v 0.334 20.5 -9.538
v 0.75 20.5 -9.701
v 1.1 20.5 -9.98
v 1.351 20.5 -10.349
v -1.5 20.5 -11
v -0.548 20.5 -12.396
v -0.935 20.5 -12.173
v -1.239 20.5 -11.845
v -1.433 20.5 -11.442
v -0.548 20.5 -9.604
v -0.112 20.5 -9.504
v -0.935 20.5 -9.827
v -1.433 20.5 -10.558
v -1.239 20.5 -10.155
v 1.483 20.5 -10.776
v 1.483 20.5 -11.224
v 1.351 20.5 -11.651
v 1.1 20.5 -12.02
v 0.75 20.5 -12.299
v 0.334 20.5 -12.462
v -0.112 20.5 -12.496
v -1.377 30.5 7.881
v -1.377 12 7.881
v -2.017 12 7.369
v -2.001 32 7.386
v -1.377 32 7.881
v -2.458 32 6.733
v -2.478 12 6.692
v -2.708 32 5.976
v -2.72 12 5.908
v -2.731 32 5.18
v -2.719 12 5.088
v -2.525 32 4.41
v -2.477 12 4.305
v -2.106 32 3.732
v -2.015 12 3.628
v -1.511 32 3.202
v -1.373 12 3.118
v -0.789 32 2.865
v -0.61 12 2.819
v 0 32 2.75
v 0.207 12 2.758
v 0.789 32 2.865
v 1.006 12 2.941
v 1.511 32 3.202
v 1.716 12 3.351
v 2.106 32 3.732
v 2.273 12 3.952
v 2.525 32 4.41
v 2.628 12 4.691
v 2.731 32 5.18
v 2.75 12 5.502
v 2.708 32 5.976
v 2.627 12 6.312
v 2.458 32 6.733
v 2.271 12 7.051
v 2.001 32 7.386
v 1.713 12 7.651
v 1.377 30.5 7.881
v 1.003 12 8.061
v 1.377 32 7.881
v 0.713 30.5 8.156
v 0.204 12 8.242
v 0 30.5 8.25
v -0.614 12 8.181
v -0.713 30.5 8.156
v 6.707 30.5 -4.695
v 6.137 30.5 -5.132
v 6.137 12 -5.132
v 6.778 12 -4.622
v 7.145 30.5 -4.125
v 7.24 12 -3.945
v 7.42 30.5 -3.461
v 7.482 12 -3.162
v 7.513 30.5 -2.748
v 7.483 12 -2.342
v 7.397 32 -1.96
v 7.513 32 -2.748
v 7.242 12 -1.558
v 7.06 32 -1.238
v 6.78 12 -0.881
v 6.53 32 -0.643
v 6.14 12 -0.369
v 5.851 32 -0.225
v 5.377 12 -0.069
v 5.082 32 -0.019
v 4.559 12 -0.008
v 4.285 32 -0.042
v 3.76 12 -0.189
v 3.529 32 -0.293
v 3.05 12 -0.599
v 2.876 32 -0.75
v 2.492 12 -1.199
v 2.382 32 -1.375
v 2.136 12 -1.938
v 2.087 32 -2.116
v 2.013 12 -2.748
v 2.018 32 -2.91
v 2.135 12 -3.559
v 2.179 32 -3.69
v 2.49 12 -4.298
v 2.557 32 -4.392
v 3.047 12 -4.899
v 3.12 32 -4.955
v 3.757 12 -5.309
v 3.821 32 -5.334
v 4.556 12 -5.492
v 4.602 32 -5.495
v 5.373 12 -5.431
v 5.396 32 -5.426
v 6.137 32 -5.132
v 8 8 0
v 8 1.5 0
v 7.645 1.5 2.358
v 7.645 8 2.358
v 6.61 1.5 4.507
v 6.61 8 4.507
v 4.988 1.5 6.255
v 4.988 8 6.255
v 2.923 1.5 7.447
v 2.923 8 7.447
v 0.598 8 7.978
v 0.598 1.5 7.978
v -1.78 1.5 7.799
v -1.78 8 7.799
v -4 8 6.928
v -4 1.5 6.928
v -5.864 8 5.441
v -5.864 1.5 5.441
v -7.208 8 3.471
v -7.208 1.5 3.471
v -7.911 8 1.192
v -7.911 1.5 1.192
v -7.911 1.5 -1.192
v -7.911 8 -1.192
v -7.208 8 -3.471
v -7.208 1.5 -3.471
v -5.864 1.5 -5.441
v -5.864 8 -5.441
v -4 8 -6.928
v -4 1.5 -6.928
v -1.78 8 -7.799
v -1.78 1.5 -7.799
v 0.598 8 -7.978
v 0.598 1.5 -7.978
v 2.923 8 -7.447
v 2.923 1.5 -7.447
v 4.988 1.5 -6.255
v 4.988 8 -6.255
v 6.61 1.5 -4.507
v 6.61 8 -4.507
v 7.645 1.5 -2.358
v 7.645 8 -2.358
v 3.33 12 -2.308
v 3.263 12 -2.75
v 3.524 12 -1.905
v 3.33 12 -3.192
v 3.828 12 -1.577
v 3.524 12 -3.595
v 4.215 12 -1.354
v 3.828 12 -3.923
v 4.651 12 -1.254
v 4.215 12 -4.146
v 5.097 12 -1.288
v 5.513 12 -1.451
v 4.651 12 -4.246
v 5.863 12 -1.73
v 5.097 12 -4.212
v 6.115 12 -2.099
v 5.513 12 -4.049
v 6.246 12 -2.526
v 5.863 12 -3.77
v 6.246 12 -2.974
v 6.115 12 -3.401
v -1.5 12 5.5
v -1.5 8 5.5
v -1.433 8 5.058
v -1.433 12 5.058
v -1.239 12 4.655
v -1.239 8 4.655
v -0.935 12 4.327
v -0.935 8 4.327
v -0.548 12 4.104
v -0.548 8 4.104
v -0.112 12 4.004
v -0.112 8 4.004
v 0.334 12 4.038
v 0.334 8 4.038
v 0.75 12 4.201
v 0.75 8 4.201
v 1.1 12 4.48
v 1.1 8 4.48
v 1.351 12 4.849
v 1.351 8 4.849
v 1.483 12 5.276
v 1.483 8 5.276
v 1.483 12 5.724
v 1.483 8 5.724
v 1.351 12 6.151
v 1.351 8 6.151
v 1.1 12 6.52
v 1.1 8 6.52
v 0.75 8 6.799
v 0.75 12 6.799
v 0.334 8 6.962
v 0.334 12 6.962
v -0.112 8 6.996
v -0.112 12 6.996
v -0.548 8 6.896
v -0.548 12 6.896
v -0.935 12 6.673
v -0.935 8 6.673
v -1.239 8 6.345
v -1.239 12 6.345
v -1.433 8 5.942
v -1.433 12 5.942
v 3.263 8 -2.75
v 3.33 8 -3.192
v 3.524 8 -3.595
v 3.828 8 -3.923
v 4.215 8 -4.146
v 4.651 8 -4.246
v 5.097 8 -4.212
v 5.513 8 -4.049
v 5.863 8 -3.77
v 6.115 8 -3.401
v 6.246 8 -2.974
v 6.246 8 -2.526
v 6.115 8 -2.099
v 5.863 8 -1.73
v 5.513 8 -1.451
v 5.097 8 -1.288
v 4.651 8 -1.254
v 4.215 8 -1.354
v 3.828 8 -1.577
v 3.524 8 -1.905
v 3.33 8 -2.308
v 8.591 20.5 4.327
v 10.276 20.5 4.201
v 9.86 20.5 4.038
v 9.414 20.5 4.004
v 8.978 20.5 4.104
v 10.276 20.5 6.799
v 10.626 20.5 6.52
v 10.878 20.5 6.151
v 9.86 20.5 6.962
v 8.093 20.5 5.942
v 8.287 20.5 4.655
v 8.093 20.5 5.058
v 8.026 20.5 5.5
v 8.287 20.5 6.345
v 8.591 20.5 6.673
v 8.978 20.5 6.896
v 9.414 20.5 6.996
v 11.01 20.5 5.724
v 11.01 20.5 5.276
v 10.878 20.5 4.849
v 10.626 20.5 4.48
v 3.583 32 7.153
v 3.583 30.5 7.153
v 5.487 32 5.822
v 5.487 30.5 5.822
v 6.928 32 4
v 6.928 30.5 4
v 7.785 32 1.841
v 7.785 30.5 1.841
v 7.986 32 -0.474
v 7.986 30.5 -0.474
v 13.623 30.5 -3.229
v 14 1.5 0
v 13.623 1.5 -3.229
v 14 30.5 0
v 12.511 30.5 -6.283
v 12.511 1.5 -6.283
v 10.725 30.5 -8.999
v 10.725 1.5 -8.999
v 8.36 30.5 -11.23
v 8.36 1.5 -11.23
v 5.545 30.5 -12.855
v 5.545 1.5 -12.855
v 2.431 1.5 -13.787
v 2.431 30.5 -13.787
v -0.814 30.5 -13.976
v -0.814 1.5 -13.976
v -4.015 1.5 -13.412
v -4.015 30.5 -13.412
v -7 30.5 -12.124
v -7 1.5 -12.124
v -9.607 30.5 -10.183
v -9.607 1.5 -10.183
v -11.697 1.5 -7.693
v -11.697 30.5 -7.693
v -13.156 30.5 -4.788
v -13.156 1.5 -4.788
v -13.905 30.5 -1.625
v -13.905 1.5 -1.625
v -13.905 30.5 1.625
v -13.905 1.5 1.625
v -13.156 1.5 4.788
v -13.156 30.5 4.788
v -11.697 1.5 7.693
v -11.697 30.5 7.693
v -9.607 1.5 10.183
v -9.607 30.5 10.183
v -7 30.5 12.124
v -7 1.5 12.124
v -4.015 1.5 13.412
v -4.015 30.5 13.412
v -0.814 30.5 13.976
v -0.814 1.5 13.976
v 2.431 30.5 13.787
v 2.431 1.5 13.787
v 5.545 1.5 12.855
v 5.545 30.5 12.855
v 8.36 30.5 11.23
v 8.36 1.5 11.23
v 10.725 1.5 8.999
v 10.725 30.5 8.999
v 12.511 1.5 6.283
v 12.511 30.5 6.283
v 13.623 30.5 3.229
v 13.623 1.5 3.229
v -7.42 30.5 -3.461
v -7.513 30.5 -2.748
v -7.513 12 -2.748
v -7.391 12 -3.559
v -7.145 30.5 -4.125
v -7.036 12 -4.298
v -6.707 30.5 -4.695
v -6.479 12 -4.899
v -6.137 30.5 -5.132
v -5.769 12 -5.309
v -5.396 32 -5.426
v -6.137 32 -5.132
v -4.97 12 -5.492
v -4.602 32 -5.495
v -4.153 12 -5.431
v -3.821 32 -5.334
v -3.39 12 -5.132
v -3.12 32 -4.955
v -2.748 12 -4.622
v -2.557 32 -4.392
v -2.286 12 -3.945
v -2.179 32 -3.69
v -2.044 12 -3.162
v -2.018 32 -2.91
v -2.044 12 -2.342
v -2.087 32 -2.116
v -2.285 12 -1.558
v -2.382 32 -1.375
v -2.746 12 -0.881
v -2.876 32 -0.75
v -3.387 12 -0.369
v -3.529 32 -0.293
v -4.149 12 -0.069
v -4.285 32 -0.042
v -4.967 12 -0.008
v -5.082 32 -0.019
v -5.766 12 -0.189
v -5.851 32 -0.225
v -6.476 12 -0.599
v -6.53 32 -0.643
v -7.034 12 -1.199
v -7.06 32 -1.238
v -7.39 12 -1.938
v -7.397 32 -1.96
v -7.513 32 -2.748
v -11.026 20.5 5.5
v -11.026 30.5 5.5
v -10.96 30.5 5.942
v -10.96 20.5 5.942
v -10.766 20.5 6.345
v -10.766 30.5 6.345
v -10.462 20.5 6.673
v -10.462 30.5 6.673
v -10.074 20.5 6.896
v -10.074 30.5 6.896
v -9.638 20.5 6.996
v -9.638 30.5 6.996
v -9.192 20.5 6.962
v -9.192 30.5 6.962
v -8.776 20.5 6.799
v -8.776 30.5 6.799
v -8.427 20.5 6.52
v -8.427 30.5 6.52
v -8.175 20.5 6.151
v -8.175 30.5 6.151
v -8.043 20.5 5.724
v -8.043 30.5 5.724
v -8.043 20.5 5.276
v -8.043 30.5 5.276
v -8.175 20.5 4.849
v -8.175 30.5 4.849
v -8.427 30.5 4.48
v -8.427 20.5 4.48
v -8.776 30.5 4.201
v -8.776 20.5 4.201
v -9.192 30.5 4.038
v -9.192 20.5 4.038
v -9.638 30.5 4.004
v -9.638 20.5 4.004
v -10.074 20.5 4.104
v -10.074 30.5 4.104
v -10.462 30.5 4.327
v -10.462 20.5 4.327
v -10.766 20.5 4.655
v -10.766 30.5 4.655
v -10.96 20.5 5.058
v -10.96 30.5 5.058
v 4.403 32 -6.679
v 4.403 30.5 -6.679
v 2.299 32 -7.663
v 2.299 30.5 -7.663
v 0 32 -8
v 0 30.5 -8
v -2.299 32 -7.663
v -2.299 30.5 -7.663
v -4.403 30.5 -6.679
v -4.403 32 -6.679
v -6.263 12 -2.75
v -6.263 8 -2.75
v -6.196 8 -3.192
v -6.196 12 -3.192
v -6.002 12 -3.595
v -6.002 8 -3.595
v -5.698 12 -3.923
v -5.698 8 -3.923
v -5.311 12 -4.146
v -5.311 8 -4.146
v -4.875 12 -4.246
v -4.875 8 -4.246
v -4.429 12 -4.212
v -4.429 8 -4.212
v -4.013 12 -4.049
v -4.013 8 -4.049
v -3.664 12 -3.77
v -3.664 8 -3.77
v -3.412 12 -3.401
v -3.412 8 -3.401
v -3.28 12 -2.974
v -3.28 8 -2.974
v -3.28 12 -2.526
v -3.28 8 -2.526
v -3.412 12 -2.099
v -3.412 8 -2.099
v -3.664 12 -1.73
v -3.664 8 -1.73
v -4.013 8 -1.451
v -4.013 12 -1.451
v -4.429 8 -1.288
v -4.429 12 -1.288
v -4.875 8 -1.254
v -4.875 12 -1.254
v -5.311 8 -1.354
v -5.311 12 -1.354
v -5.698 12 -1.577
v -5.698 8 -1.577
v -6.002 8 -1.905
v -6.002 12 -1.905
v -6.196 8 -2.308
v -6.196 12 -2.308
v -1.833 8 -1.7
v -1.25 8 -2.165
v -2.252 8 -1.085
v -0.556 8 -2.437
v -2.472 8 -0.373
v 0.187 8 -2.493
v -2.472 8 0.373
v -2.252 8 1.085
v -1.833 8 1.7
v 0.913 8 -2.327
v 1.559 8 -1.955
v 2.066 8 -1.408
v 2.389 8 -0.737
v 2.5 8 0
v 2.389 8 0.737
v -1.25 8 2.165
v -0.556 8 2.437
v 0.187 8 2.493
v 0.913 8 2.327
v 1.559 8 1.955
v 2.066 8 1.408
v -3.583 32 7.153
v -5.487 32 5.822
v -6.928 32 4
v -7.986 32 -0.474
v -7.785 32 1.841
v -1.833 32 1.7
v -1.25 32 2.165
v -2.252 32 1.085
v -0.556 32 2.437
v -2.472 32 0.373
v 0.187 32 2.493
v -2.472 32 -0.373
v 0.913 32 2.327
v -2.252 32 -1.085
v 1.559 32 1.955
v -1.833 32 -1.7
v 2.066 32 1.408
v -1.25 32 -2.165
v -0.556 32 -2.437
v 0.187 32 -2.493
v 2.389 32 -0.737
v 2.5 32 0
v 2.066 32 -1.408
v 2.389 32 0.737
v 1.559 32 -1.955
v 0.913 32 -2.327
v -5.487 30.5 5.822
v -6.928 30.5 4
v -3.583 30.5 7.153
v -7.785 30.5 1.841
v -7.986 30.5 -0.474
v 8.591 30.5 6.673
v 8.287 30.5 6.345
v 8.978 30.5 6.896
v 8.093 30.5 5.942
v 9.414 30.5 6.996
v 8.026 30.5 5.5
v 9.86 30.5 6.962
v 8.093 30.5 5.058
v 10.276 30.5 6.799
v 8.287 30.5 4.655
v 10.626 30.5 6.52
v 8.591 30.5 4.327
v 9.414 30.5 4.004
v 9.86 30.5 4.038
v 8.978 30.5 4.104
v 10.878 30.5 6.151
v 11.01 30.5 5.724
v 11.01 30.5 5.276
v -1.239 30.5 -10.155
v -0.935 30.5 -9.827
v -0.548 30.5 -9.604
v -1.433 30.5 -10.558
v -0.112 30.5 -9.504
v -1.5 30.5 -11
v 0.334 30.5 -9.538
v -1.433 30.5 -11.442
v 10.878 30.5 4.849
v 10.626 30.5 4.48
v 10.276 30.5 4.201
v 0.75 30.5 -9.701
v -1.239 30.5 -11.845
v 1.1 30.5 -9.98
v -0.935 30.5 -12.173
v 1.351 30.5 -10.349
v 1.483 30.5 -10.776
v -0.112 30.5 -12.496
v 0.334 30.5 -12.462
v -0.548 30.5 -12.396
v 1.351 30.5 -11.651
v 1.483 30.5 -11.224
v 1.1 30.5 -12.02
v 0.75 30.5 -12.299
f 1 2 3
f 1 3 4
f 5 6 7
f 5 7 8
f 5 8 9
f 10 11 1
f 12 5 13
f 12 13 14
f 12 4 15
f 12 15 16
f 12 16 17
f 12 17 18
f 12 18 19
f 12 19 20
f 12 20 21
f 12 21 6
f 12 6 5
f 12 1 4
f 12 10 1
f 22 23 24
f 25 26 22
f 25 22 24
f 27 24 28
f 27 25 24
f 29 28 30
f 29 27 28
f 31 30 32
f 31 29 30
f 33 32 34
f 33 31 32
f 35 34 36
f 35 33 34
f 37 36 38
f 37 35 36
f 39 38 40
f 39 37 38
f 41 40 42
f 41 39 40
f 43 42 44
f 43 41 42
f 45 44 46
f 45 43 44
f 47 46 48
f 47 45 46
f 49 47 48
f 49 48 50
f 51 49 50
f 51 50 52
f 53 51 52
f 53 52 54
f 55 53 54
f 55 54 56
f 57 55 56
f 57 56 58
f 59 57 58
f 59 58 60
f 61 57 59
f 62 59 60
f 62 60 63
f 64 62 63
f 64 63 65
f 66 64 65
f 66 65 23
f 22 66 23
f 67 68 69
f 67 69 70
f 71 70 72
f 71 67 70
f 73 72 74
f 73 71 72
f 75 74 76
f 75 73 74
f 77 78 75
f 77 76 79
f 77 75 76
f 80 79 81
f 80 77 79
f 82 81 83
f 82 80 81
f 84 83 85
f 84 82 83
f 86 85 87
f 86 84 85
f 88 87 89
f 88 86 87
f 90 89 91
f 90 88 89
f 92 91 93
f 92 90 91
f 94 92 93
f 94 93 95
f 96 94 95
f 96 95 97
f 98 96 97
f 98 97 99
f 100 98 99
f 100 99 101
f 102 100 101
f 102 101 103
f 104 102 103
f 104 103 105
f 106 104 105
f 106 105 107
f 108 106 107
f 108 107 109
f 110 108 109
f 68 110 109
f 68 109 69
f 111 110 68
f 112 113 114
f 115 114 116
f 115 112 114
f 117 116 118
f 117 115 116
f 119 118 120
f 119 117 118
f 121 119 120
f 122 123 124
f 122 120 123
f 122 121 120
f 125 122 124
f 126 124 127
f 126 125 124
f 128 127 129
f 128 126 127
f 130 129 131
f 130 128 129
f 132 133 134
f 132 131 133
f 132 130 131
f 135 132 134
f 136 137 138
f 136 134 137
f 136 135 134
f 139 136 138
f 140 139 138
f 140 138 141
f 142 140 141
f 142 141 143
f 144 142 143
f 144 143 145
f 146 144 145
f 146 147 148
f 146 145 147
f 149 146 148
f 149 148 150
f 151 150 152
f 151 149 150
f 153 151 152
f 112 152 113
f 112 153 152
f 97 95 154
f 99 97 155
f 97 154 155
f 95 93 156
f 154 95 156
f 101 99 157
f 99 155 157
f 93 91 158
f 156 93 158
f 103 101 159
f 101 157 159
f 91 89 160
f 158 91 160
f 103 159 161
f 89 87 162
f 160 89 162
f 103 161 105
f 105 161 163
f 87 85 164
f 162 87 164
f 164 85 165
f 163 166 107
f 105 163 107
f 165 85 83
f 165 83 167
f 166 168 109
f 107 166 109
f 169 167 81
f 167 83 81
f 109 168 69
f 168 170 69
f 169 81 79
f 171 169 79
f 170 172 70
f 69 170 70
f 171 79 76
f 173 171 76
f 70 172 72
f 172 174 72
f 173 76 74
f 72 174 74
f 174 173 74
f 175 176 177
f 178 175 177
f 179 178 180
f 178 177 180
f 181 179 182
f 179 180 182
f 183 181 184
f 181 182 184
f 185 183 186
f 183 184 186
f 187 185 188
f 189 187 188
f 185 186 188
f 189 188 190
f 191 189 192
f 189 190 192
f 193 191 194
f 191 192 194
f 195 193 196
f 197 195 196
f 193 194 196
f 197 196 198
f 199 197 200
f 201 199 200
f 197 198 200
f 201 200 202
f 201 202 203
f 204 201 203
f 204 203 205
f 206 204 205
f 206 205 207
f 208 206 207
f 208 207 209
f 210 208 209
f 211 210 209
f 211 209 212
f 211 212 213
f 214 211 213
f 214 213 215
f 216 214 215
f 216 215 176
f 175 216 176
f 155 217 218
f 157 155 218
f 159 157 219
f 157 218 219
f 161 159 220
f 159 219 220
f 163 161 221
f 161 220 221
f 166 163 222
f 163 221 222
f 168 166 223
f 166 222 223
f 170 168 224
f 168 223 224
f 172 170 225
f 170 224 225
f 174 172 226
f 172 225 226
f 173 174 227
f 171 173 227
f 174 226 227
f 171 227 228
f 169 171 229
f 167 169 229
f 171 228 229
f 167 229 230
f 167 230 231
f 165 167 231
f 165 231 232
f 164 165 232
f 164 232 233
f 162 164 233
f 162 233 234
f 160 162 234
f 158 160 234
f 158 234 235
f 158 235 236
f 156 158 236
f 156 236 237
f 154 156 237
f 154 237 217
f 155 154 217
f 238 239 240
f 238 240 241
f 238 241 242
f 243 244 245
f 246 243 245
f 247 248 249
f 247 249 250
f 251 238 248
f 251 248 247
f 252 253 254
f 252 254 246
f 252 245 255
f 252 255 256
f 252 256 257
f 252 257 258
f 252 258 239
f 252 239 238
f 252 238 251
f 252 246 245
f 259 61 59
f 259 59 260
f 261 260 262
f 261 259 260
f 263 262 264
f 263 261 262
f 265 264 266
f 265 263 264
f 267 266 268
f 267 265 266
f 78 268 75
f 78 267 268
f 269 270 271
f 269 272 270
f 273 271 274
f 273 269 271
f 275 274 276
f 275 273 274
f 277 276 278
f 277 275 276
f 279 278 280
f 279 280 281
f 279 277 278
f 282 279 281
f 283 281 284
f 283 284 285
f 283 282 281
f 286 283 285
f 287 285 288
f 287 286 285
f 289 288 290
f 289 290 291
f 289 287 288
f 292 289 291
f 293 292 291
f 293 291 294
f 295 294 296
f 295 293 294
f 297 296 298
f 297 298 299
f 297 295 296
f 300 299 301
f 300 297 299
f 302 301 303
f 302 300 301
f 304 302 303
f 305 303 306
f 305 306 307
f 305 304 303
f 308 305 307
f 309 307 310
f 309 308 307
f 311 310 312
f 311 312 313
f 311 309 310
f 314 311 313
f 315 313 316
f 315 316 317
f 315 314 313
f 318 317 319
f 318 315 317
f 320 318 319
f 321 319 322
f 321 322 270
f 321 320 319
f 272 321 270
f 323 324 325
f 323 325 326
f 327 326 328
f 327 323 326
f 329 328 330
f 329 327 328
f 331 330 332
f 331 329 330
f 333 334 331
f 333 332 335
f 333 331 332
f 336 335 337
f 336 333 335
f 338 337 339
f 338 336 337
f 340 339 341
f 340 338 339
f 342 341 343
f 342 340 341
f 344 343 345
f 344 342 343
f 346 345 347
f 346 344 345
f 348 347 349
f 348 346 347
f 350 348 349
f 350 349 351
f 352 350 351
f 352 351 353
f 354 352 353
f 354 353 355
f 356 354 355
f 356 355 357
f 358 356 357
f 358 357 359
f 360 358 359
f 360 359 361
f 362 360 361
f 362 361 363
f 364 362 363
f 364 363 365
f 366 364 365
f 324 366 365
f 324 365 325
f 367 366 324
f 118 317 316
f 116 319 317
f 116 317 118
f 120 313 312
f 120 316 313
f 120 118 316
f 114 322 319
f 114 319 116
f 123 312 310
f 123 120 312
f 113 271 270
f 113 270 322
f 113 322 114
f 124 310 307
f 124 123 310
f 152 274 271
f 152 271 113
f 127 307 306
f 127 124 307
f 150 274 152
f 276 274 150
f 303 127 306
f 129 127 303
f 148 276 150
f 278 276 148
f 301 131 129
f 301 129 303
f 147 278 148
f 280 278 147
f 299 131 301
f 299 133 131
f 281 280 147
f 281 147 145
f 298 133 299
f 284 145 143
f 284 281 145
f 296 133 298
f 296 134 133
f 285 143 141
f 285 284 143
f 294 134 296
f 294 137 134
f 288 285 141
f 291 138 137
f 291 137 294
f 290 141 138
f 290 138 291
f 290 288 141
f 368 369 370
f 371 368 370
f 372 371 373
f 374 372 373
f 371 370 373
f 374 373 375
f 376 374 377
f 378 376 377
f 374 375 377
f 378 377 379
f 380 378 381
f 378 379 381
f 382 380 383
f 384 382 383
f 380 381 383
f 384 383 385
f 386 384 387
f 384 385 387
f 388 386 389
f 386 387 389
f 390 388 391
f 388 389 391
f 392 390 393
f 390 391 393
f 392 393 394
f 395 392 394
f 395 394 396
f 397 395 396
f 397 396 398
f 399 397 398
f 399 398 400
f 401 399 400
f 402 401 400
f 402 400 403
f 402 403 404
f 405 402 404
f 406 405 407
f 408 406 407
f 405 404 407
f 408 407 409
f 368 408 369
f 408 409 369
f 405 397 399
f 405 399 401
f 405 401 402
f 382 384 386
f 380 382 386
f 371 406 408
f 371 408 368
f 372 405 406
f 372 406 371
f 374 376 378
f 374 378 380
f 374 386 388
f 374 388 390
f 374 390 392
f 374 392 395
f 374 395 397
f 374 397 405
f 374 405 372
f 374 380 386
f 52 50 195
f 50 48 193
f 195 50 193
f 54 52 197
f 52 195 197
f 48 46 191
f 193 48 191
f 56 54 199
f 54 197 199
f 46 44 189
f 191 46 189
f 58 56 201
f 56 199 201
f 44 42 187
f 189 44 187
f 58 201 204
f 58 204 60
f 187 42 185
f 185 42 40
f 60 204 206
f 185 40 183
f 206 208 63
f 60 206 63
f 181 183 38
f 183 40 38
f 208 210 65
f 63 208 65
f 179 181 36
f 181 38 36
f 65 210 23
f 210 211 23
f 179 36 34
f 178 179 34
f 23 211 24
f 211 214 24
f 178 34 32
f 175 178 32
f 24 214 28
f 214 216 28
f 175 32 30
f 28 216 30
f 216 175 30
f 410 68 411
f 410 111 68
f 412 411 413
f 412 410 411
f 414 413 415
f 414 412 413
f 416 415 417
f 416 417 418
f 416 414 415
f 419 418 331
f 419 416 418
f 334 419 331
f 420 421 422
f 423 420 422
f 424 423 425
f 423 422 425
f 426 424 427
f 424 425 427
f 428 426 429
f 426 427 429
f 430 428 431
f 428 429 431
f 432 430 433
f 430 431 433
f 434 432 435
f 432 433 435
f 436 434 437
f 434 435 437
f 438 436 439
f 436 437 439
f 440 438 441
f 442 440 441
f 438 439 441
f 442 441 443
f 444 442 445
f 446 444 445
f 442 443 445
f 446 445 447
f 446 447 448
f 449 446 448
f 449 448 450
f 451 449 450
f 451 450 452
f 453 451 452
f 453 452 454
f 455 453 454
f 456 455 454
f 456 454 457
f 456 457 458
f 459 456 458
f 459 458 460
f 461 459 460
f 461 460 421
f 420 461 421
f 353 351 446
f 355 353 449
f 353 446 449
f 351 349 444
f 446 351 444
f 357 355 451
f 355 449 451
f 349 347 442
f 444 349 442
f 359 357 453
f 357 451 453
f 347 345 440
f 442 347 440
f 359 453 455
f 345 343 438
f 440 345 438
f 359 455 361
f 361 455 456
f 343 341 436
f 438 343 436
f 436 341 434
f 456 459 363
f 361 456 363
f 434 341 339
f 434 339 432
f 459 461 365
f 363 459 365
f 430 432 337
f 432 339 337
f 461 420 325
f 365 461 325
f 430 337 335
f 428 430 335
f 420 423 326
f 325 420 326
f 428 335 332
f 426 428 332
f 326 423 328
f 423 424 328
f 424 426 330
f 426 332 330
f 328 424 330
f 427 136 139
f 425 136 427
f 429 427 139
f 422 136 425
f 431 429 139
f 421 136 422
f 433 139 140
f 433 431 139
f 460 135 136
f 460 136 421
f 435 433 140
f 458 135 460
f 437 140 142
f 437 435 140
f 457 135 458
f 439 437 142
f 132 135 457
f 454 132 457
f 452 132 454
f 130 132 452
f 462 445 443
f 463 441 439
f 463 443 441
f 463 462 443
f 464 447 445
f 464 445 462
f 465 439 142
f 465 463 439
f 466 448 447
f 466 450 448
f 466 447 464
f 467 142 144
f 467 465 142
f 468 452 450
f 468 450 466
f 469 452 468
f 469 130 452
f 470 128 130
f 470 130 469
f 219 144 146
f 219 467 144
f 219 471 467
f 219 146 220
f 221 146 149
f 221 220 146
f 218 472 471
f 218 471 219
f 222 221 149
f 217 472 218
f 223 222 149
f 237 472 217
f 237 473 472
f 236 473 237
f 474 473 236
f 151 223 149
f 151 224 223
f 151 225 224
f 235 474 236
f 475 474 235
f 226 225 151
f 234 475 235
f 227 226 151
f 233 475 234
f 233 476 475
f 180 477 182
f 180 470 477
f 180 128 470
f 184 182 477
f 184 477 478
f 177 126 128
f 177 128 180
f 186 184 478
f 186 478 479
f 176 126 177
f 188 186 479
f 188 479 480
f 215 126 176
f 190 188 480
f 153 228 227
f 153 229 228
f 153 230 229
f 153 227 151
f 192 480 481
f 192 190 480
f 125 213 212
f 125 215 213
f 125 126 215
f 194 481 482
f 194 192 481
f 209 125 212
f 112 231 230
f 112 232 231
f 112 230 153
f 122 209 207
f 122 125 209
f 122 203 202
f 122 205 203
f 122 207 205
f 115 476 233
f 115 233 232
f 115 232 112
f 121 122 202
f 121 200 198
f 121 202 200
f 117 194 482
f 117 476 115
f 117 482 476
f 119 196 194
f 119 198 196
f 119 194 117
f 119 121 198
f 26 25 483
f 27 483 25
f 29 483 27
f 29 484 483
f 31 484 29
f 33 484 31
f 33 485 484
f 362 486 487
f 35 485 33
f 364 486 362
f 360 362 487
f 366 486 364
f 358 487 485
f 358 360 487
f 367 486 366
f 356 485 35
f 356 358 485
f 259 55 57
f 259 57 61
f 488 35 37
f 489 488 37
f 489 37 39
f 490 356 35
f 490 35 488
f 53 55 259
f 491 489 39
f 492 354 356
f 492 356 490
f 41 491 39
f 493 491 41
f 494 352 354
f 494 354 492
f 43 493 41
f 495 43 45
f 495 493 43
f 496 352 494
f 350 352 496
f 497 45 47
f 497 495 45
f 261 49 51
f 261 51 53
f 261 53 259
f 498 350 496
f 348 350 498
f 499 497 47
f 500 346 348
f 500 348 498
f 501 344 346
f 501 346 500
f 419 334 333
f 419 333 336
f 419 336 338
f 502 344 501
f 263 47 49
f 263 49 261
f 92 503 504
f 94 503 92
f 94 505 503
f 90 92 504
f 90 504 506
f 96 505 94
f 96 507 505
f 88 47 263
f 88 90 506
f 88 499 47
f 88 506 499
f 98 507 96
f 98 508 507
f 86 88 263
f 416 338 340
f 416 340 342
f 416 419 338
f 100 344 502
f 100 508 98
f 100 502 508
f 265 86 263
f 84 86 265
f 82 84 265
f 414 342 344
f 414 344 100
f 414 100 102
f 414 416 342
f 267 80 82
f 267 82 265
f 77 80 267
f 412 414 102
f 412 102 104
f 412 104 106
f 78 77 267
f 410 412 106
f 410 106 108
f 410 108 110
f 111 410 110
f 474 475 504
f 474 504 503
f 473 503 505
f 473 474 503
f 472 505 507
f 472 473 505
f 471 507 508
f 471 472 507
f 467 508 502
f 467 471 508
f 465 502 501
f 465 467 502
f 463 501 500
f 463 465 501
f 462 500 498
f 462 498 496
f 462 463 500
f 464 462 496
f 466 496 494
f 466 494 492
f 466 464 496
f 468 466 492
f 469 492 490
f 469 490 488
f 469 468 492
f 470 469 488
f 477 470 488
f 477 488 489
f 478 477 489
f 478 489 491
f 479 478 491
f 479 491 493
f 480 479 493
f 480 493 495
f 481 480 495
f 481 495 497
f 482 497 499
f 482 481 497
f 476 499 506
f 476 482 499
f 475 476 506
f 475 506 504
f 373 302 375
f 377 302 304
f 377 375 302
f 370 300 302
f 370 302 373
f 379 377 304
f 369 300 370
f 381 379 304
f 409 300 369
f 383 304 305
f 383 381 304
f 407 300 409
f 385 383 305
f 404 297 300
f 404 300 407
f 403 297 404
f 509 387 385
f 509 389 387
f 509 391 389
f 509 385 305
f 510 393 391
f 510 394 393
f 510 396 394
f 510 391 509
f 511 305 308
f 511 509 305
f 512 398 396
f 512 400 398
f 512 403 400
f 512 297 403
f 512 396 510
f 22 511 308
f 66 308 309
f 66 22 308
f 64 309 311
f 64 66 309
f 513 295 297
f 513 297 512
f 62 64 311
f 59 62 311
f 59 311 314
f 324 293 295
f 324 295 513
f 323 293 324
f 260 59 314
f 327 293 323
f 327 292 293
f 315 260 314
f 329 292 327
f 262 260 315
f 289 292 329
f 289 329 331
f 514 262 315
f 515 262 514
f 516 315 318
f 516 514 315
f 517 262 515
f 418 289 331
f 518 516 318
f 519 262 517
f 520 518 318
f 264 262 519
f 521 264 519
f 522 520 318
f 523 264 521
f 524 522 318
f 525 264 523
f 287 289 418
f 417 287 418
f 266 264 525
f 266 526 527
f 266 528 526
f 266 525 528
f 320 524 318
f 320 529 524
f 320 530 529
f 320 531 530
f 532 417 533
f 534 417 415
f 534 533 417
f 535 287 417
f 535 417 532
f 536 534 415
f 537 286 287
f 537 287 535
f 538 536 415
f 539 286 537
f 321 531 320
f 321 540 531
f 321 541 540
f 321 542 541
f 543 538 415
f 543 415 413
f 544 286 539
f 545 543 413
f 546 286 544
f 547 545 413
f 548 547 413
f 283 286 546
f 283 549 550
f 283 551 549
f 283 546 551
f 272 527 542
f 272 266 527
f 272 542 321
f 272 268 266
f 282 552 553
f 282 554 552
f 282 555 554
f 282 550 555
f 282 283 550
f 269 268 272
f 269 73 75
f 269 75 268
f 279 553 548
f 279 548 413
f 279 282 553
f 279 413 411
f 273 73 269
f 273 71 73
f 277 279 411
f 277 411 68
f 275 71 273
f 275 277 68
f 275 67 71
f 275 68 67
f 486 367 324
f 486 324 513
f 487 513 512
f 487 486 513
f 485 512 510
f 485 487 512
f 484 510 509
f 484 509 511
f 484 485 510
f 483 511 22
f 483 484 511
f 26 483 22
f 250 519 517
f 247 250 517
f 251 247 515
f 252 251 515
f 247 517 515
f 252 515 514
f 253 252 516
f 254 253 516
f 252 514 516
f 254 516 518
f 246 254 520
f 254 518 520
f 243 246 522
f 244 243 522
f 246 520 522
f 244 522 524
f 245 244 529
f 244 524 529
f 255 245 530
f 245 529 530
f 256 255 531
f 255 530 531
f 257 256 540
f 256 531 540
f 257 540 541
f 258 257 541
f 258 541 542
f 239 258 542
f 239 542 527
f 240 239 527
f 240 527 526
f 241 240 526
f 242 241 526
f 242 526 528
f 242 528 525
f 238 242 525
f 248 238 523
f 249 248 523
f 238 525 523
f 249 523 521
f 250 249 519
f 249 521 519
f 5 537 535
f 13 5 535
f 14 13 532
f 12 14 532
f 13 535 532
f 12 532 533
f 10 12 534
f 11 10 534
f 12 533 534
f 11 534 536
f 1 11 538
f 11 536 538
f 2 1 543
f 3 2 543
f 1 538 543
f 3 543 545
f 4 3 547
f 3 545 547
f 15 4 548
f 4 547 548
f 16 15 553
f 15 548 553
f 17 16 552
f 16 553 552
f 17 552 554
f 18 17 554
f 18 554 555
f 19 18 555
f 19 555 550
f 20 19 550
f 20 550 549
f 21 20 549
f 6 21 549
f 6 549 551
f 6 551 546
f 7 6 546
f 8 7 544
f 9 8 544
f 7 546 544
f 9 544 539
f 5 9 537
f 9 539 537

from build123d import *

# Parameters (mm, degrees)
ESQUISSE2_R                         = 1.5
ENL_V_MAT_EXTRU_1_DEPTH             = 10
ESQUISSE3_R                         = 1.5
ENL_V_MAT_EXTRU_2_DEPTH             = 37.362755671
ENL_V_MAT_EXTRU_2_DIRECTION_2_REACH = 38.363
ESQUISSE4_R                         = 2.75
ENL_V_MAT_EXTRU_7_DEPTH             = 20
ENL_V_START                         = -8
ESQUISSE5_R                         = 8
ENL_V_MAT_EXTRU_8_DEPTH             = 8


with BuildPart() as part:
    # Esquisse1 → Révolution1 (revolve)
    with BuildSketch(Plane.XY):
        Polygon((8, 0), (8, 1.5), (14, 1.5), (14, 30.5), (8, 30.5), (8, 32), (2.5, 32), (2.5, 0), align=None)
    revolve(axis=Axis((0, 0, 0), (0, 1, 0)))

    # Esquisse2 → Enlèv. mat.-Extru.1 (cut)
    with BuildSketch(Plane(origin=(0, 30.5, 0), x_dir=(1, 0, 0), z_dir=(0, 1, 0))):
        with Locations(Location((0, 11, 0), (0, 0, 180))):
            Circle(ESQUISSE2_R)
        with Locations(Location((9.526279442, -5.5, 0), (0, 0, 180))):
            Circle(ESQUISSE2_R)
        with Locations(Location((-9.526279442, -5.5, 0), (0, 0, 180))):
            Circle(ESQUISSE2_R)
    extrude(amount=-ENL_V_MAT_EXTRU_1_DEPTH, mode=Mode.SUBTRACT)

    # Esquisse3 → Enlèv. mat.-Extru.2 (cut)
    with BuildSketch(Plane.XZ.offset(-1.5)):
        with Locations(Location((0, 5.5, 0), (0, 0, 180))):
            Circle(ESQUISSE3_R)
        with Locations(Location((4.763139721, -2.75, 0), (0, 0, 180))):
            Circle(ESQUISSE3_R)
        with Locations(Location((-4.763139721, -2.75, 0), (0, 0, 180))):
            Circle(ESQUISSE3_R)
    extrude(amount=-ENL_V_MAT_EXTRU_2_DEPTH, mode=Mode.SUBTRACT)

    # Esquisse3 → Enlèv. mat.-Extru.2 direction 2 (cut, up to next)
    with BuildSketch(Plane.XZ.offset(-1.5), mode=Mode.PRIVATE) as enl_v_mat_extru_2_direction_2_sk1:
        with Locations(Location((0, 5.5, 0), (0, 0, 180))):
            Circle(ESQUISSE3_R)
    enl_v_mat_extru_2_direction_2_tool1 = extrude(enl_v_mat_extru_2_direction_2_sk1.sketch, amount=ENL_V_MAT_EXTRU_2_DIRECTION_2_REACH, mode=Mode.PRIVATE) & part.part
    # Esquisse3 → Enlèv. mat.-Extru.2 direction 2 (cut, up to next)
    with BuildSketch(Plane.XZ.offset(-1.5), mode=Mode.PRIVATE) as enl_v_mat_extru_2_direction_2_sk2:
        with Locations(Location((4.763139721, -2.75, 0), (0, 0, 180))):
            Circle(ESQUISSE3_R)
    enl_v_mat_extru_2_direction_2_tool2 = extrude(enl_v_mat_extru_2_direction_2_sk2.sketch, amount=ENL_V_MAT_EXTRU_2_DIRECTION_2_REACH, mode=Mode.PRIVATE) & part.part
    # Esquisse3 → Enlèv. mat.-Extru.2 direction 2 (cut, up to next)
    with BuildSketch(Plane.XZ.offset(-1.5), mode=Mode.PRIVATE) as enl_v_mat_extru_2_direction_2_sk3:
        with Locations(Location((-4.763139721, -2.75, 0), (0, 0, 180))):
            Circle(ESQUISSE3_R)
    enl_v_mat_extru_2_direction_2_tool3 = extrude(enl_v_mat_extru_2_direction_2_sk3.sketch, amount=ENL_V_MAT_EXTRU_2_DIRECTION_2_REACH, mode=Mode.PRIVATE) & part.part
    add(enl_v_mat_extru_2_direction_2_tool1.solids().sort_by_distance((0, 1.5, 5.5))[0], mode=Mode.SUBTRACT)
    add(enl_v_mat_extru_2_direction_2_tool2.solids().sort_by_distance((4.76314, 1.5, -2.75))[0], mode=Mode.SUBTRACT)
    add(enl_v_mat_extru_2_direction_2_tool3.solids().sort_by_distance((-4.76314, 1.5, -2.75))[0], mode=Mode.SUBTRACT)

    # Esquisse4 → Enlèv. mat.-Extru.7 (cut)
    with BuildSketch(Plane.XZ.offset(-32)):
        with Locations(Location((0, 5.5, 0), (0, 0, 120.036983744))):
            Circle(ESQUISSE4_R)
        with Locations(Location((4.763139721, -2.75, 0), (0, 0, 299.963016256))):
            Circle(ESQUISSE4_R)
        with Locations(Location((-4.763139721, -2.75, 0), (0, 0, 179.963016256))):
            Circle(ESQUISSE4_R)
    extrude(amount=ENL_V_MAT_EXTRU_7_DEPTH, mode=Mode.SUBTRACT)

    # Esquisse5 → Enlèv. mat.-Extru.8 (cut)
    with BuildSketch(Plane.XZ.offset(ENL_V_START)):
        Circle(ESQUISSE5_R)
    extrude(amount=ENL_V_MAT_EXTRU_8_DEPTH, mode=Mode.SUBTRACT)


solid = part.part
